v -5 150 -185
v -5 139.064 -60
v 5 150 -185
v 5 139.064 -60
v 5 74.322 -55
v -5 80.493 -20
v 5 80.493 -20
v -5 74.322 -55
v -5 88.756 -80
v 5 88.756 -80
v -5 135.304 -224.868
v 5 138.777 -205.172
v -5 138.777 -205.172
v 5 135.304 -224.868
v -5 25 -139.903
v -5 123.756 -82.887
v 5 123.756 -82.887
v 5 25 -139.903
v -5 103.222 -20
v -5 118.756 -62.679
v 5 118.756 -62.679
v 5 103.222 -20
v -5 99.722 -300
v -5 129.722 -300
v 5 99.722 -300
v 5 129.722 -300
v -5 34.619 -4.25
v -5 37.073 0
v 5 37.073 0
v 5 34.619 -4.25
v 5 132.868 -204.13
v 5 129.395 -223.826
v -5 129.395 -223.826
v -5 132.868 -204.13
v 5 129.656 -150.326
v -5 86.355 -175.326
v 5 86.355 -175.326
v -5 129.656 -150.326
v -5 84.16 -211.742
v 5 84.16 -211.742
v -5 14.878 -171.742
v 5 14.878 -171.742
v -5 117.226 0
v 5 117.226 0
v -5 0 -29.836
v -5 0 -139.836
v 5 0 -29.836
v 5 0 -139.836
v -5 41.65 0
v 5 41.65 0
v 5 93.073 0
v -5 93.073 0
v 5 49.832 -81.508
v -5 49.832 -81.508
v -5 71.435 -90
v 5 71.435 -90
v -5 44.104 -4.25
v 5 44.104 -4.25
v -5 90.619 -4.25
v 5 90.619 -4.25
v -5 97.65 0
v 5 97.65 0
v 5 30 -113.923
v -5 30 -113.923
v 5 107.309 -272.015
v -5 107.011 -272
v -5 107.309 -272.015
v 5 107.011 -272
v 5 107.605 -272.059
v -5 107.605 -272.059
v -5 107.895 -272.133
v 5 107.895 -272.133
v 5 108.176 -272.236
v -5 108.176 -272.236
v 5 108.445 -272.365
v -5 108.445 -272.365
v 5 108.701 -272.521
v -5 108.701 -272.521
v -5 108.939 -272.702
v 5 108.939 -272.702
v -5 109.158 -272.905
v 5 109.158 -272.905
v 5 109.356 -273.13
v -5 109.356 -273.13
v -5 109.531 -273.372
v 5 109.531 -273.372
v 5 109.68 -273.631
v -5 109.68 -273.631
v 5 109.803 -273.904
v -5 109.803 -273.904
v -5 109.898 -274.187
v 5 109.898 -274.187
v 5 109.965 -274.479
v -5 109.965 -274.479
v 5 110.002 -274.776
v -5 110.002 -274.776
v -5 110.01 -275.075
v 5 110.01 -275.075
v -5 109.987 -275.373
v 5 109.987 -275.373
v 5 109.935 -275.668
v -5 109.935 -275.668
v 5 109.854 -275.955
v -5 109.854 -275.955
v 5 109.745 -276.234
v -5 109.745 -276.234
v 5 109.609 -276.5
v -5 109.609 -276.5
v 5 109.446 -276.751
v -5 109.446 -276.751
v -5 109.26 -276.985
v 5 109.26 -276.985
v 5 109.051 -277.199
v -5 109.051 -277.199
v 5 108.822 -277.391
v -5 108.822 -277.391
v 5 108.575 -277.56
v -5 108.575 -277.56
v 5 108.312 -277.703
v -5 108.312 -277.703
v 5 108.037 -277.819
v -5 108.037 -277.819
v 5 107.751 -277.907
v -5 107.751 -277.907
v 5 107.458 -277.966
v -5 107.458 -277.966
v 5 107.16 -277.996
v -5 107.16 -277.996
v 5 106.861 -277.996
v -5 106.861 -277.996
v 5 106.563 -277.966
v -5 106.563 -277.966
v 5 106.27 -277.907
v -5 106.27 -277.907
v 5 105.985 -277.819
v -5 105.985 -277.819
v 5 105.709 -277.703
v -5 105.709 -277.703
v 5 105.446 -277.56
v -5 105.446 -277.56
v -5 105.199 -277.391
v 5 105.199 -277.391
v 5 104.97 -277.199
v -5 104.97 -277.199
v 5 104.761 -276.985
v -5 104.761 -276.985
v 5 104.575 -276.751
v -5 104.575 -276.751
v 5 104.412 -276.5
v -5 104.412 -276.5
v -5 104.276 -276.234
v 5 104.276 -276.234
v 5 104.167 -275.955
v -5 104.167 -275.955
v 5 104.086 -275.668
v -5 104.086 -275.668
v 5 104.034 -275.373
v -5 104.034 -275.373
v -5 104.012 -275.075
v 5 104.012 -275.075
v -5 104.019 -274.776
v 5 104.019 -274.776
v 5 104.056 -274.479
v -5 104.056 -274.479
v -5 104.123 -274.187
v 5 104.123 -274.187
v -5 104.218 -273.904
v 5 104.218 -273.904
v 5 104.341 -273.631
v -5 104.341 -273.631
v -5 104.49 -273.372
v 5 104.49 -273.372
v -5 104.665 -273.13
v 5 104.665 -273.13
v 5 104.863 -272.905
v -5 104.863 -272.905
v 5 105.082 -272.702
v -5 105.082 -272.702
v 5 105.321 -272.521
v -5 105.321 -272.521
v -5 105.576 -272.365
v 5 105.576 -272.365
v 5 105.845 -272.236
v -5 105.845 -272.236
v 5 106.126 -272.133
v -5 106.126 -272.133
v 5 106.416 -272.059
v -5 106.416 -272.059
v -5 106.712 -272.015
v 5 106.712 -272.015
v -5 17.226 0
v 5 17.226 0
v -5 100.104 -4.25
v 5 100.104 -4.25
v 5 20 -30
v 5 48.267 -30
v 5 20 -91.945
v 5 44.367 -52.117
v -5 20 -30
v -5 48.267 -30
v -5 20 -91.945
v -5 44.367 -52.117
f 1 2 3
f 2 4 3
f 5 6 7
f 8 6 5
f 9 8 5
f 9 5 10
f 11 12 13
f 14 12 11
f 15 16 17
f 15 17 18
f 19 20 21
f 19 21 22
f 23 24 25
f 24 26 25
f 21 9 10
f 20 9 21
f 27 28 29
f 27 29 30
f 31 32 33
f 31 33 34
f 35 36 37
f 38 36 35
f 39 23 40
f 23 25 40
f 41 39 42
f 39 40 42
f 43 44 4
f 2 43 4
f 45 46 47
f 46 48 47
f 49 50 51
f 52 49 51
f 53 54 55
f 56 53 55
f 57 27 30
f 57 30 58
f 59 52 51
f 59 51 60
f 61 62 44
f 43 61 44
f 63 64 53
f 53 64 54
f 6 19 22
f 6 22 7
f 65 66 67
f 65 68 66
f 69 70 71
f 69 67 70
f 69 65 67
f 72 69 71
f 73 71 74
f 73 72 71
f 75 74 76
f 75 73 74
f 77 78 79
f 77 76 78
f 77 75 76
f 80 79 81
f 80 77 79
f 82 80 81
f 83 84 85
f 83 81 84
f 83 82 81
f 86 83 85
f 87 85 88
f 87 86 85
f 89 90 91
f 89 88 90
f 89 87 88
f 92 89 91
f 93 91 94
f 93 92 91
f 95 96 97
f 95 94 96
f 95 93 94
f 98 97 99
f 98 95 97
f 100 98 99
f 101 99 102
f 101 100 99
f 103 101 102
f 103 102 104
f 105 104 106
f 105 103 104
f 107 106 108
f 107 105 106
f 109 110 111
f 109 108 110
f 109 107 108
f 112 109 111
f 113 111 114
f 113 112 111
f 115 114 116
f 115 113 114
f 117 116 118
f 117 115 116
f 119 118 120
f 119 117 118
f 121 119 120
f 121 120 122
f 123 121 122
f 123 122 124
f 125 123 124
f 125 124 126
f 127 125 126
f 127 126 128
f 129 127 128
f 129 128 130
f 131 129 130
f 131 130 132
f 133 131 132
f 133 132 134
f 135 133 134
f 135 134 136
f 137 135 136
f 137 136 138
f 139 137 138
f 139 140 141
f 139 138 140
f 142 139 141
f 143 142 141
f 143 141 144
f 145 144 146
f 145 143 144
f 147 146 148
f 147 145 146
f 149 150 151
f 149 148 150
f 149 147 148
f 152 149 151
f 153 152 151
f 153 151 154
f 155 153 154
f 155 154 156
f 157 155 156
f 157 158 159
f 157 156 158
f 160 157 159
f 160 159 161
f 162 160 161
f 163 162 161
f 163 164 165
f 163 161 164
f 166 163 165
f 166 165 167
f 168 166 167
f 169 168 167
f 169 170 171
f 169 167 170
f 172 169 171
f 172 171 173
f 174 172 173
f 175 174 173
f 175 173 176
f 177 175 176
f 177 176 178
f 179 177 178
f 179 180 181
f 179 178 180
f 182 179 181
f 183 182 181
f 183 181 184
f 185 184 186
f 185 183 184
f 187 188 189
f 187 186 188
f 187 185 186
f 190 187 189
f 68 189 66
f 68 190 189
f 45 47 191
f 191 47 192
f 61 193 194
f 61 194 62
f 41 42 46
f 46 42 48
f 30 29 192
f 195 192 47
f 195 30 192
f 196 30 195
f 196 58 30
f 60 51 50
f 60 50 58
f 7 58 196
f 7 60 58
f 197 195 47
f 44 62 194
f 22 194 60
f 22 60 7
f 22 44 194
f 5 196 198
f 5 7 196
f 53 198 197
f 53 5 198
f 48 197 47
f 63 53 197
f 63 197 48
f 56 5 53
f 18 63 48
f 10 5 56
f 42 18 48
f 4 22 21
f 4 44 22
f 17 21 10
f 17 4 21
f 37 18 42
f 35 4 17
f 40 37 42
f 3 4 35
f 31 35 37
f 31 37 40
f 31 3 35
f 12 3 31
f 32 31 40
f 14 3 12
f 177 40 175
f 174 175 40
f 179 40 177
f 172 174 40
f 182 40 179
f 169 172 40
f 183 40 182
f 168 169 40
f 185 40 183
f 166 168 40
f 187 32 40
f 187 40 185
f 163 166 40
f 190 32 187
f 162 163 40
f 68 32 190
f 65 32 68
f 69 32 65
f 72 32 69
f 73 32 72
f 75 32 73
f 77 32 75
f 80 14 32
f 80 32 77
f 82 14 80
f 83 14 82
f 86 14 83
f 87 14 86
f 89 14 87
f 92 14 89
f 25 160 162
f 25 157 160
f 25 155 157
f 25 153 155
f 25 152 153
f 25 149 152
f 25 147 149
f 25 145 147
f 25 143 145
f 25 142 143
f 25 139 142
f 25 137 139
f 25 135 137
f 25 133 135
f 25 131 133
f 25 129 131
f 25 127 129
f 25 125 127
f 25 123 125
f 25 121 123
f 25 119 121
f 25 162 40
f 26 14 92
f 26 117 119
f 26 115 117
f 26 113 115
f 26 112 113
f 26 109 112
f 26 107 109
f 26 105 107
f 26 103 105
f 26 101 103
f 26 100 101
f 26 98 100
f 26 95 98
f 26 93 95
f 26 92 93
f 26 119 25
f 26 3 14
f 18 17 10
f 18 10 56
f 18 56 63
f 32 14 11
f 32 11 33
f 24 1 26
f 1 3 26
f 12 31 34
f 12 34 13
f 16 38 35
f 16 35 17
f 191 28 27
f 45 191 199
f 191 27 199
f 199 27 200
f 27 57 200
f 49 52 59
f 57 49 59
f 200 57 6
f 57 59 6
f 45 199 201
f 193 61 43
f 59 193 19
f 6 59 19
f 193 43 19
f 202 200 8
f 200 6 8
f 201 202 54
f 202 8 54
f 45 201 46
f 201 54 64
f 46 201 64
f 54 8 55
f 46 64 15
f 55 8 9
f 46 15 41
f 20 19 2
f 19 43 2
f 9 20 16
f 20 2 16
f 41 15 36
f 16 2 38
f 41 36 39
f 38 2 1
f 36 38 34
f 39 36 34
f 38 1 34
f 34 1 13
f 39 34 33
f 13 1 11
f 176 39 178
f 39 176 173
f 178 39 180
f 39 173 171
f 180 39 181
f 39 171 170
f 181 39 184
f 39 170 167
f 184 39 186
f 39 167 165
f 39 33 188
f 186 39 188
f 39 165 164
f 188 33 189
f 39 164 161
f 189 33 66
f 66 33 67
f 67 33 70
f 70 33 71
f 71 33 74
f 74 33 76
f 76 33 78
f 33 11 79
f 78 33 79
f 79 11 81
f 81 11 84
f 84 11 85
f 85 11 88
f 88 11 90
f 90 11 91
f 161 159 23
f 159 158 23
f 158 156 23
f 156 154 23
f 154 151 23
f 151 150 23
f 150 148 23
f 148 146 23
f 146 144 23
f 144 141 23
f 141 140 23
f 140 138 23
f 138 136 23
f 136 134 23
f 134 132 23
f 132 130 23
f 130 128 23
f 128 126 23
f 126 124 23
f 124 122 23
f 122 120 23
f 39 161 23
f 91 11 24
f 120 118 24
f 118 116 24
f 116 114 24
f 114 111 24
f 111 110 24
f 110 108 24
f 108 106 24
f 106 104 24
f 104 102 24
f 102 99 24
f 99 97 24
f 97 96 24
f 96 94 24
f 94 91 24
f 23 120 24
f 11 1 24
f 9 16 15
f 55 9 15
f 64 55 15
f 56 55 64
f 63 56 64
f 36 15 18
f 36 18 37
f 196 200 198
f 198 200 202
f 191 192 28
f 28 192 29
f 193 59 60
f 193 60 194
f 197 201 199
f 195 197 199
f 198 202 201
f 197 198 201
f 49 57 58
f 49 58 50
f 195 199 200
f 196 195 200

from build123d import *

# Parameters (mm, degrees)
ESQUISSE1_W                  = 300
ESQUISSE1_H                  = 150
BOSS_EXTRU_1_DEPTH           = 5
ESQUISSE2_OUTSIDE_W          = 369.112
ESQUISSE2_OUTSIDE_H          = 219.112
ENL_V_MAT_EXTRU_1_DEPTH      = 5
ENL_V_MAT_EXTRU_2_DEPTH      = 336.559234711
ENL_V_MAT_EXTRU_2_DEPTH_BACK = 336.559234711
ENL_V_MAT_EXTRU_4_DEPTH      = 336.559234711
ENL_V_MAT_EXTRU_4_DEPTH_BACK = 336.559234711
ESQUISSE5_R                  = 3
ENL_V_MAT_EXTRU_5_DEPTH      = 49
EMPREINTE1_START             = -5
EMPREINTE1_DEPTH             = 10
D_PLACER_START               = -5
D_PLACER_LA_FACE1_DEPTH      = 10


# Read off the part's stored shape, not the designer's step: Empreinte1, Déplacer la face1
with BuildPart() as part:
    # Esquisse1 → Boss.-Extru.1 (new, symmetric)
    with BuildSketch(Plane(origin=(0, 0, 0), x_dir=(0, 0, -1), z_dir=(1, 0, 0))):
        with Locations((150, 75)):
            Rectangle(ESQUISSE1_W, ESQUISSE1_H)
    extrude(amount=BOSS_EXTRU_1_DEPTH, both=True)

    # Esquisse2 outside → Enlèv. mat.-Extru.1 (cut, symmetric)
    with BuildSketch(Plane(origin=(0, 0, 0), x_dir=(0, 0, -1), z_dir=(1, 0, 0))):
        with Locations((150, 75)):
            Rectangle(ESQUISSE2_OUTSIDE_W, ESQUISSE2_OUTSIDE_H)
        Polygon((0, 117.225703003), (60, 139.063917059), (185, 150), (300, 129.722397219), (300, 99.722397219), (211.741963761, 84.160124165), (171.741963761, 14.878091862), (139.835792798, 0), (29.835792798, 0), (0, 17.225703003), align=None, mode=Mode.SUBTRACT)
    extrude(amount=ENL_V_MAT_EXTRU_1_DEPTH, both=True, mode=Mode.SUBTRACT)

    # Esquisse3 → Enlèv. mat.-Extru.2 (cut, two sides: drawn at the far end of the back side and taken through both)
    with BuildSketch(Plane(origin=(5, 0, 0), x_dir=(0, 0, -1), z_dir=(1, 0, 0)).offset(-ENL_V_MAT_EXTRU_2_DEPTH_BACK)):
        Polygon((20, 103.221552239), (20, 80.493304508), (55, 74.321860183), (80, 88.755616913), (62.679491924, 118.755616913), align=None)
        Polygon((90, 71.435108837), (113.922571241, 30), (81.508057782, 49.831775443), align=None)
        Polygon((82.886751346, 123.755616913), (139.903333355, 25), (175.32640016, 86.354551467), (150.32640016, 129.655821657), align=None)
        Polygon((91.944969354, 20), (30, 20), (30, 48.267236345), (52.117107943, 44.367393479), align=None)
    extrude(amount=ENL_V_MAT_EXTRU_2_DEPTH + ENL_V_MAT_EXTRU_2_DEPTH_BACK, mode=Mode.SUBTRACT)

    # Esquisse5 → Enlèv. mat.-Extru.4 (cut, two sides: drawn at the far end of the back side and taken through both)
    with BuildSketch(Plane.ZY.offset(5).offset(-ENL_V_MAT_EXTRU_4_DEPTH_BACK)):
        with Locations((-275, 107.010571736)):
            Circle(ESQUISSE5_R)
    extrude(amount=ENL_V_MAT_EXTRU_4_DEPTH + ENL_V_MAT_EXTRU_4_DEPTH_BACK, mode=Mode.SUBTRACT)

    # Esquisse6 → Enlèv. mat.-Extru.5 (cut)
    with BuildSketch(Plane(origin=(5, 0, 0), x_dir=(0, 0, -1), z_dir=(1, 0, 0))):
        Polygon((205.171612033, 138.776729635), (224.867767093, 135.303766081), (223.825878027, 129.394919563), (204.129722967, 132.867883116), align=None)
    extrude(amount=-ENL_V_MAT_EXTRU_5_DEPTH, mode=Mode.SUBTRACT)

    # Empreinte1 outline → Empreinte1 (cut)
    with BuildSketch(Plane.YZ.offset(EMPREINTE1_START)):
        Polygon((97.361325712, 0), (93.361325712, 0), (91.051924635, -4), (99.670726788, -4), align=None)
        Polygon((35.051924635, -4), (43.670726788, -4), (41.361325712, 0), (37.361325712, 0), align=None)
    extrude(amount=EMPREINTE1_DEPTH, mode=Mode.SUBTRACT)

    # Déplacer la face1 outline → Déplacer la face1 (cut)
    with BuildSketch(Plane.YZ.offset(D_PLACER_START)):
        Polygon((93.361325712, 0), (93.072650577, 0), (90.618911933, -4.25), (100.10373949, -4.25), (97.650000846, 0), (97.361325712, 0), (99.670726788, -4), (91.051924635, -4), align=None)
        Polygon((34.618911933, -4.25), (44.10373949, -4.25), (41.650000846, 0), (41.361325712, 0), (43.670726788, -4), (35.051924635, -4), (37.361325712, 0), (37.072650577, 0), align=None)
    extrude(amount=D_PLACER_LA_FACE1_DEPTH, mode=Mode.SUBTRACT)


solid = part.part
